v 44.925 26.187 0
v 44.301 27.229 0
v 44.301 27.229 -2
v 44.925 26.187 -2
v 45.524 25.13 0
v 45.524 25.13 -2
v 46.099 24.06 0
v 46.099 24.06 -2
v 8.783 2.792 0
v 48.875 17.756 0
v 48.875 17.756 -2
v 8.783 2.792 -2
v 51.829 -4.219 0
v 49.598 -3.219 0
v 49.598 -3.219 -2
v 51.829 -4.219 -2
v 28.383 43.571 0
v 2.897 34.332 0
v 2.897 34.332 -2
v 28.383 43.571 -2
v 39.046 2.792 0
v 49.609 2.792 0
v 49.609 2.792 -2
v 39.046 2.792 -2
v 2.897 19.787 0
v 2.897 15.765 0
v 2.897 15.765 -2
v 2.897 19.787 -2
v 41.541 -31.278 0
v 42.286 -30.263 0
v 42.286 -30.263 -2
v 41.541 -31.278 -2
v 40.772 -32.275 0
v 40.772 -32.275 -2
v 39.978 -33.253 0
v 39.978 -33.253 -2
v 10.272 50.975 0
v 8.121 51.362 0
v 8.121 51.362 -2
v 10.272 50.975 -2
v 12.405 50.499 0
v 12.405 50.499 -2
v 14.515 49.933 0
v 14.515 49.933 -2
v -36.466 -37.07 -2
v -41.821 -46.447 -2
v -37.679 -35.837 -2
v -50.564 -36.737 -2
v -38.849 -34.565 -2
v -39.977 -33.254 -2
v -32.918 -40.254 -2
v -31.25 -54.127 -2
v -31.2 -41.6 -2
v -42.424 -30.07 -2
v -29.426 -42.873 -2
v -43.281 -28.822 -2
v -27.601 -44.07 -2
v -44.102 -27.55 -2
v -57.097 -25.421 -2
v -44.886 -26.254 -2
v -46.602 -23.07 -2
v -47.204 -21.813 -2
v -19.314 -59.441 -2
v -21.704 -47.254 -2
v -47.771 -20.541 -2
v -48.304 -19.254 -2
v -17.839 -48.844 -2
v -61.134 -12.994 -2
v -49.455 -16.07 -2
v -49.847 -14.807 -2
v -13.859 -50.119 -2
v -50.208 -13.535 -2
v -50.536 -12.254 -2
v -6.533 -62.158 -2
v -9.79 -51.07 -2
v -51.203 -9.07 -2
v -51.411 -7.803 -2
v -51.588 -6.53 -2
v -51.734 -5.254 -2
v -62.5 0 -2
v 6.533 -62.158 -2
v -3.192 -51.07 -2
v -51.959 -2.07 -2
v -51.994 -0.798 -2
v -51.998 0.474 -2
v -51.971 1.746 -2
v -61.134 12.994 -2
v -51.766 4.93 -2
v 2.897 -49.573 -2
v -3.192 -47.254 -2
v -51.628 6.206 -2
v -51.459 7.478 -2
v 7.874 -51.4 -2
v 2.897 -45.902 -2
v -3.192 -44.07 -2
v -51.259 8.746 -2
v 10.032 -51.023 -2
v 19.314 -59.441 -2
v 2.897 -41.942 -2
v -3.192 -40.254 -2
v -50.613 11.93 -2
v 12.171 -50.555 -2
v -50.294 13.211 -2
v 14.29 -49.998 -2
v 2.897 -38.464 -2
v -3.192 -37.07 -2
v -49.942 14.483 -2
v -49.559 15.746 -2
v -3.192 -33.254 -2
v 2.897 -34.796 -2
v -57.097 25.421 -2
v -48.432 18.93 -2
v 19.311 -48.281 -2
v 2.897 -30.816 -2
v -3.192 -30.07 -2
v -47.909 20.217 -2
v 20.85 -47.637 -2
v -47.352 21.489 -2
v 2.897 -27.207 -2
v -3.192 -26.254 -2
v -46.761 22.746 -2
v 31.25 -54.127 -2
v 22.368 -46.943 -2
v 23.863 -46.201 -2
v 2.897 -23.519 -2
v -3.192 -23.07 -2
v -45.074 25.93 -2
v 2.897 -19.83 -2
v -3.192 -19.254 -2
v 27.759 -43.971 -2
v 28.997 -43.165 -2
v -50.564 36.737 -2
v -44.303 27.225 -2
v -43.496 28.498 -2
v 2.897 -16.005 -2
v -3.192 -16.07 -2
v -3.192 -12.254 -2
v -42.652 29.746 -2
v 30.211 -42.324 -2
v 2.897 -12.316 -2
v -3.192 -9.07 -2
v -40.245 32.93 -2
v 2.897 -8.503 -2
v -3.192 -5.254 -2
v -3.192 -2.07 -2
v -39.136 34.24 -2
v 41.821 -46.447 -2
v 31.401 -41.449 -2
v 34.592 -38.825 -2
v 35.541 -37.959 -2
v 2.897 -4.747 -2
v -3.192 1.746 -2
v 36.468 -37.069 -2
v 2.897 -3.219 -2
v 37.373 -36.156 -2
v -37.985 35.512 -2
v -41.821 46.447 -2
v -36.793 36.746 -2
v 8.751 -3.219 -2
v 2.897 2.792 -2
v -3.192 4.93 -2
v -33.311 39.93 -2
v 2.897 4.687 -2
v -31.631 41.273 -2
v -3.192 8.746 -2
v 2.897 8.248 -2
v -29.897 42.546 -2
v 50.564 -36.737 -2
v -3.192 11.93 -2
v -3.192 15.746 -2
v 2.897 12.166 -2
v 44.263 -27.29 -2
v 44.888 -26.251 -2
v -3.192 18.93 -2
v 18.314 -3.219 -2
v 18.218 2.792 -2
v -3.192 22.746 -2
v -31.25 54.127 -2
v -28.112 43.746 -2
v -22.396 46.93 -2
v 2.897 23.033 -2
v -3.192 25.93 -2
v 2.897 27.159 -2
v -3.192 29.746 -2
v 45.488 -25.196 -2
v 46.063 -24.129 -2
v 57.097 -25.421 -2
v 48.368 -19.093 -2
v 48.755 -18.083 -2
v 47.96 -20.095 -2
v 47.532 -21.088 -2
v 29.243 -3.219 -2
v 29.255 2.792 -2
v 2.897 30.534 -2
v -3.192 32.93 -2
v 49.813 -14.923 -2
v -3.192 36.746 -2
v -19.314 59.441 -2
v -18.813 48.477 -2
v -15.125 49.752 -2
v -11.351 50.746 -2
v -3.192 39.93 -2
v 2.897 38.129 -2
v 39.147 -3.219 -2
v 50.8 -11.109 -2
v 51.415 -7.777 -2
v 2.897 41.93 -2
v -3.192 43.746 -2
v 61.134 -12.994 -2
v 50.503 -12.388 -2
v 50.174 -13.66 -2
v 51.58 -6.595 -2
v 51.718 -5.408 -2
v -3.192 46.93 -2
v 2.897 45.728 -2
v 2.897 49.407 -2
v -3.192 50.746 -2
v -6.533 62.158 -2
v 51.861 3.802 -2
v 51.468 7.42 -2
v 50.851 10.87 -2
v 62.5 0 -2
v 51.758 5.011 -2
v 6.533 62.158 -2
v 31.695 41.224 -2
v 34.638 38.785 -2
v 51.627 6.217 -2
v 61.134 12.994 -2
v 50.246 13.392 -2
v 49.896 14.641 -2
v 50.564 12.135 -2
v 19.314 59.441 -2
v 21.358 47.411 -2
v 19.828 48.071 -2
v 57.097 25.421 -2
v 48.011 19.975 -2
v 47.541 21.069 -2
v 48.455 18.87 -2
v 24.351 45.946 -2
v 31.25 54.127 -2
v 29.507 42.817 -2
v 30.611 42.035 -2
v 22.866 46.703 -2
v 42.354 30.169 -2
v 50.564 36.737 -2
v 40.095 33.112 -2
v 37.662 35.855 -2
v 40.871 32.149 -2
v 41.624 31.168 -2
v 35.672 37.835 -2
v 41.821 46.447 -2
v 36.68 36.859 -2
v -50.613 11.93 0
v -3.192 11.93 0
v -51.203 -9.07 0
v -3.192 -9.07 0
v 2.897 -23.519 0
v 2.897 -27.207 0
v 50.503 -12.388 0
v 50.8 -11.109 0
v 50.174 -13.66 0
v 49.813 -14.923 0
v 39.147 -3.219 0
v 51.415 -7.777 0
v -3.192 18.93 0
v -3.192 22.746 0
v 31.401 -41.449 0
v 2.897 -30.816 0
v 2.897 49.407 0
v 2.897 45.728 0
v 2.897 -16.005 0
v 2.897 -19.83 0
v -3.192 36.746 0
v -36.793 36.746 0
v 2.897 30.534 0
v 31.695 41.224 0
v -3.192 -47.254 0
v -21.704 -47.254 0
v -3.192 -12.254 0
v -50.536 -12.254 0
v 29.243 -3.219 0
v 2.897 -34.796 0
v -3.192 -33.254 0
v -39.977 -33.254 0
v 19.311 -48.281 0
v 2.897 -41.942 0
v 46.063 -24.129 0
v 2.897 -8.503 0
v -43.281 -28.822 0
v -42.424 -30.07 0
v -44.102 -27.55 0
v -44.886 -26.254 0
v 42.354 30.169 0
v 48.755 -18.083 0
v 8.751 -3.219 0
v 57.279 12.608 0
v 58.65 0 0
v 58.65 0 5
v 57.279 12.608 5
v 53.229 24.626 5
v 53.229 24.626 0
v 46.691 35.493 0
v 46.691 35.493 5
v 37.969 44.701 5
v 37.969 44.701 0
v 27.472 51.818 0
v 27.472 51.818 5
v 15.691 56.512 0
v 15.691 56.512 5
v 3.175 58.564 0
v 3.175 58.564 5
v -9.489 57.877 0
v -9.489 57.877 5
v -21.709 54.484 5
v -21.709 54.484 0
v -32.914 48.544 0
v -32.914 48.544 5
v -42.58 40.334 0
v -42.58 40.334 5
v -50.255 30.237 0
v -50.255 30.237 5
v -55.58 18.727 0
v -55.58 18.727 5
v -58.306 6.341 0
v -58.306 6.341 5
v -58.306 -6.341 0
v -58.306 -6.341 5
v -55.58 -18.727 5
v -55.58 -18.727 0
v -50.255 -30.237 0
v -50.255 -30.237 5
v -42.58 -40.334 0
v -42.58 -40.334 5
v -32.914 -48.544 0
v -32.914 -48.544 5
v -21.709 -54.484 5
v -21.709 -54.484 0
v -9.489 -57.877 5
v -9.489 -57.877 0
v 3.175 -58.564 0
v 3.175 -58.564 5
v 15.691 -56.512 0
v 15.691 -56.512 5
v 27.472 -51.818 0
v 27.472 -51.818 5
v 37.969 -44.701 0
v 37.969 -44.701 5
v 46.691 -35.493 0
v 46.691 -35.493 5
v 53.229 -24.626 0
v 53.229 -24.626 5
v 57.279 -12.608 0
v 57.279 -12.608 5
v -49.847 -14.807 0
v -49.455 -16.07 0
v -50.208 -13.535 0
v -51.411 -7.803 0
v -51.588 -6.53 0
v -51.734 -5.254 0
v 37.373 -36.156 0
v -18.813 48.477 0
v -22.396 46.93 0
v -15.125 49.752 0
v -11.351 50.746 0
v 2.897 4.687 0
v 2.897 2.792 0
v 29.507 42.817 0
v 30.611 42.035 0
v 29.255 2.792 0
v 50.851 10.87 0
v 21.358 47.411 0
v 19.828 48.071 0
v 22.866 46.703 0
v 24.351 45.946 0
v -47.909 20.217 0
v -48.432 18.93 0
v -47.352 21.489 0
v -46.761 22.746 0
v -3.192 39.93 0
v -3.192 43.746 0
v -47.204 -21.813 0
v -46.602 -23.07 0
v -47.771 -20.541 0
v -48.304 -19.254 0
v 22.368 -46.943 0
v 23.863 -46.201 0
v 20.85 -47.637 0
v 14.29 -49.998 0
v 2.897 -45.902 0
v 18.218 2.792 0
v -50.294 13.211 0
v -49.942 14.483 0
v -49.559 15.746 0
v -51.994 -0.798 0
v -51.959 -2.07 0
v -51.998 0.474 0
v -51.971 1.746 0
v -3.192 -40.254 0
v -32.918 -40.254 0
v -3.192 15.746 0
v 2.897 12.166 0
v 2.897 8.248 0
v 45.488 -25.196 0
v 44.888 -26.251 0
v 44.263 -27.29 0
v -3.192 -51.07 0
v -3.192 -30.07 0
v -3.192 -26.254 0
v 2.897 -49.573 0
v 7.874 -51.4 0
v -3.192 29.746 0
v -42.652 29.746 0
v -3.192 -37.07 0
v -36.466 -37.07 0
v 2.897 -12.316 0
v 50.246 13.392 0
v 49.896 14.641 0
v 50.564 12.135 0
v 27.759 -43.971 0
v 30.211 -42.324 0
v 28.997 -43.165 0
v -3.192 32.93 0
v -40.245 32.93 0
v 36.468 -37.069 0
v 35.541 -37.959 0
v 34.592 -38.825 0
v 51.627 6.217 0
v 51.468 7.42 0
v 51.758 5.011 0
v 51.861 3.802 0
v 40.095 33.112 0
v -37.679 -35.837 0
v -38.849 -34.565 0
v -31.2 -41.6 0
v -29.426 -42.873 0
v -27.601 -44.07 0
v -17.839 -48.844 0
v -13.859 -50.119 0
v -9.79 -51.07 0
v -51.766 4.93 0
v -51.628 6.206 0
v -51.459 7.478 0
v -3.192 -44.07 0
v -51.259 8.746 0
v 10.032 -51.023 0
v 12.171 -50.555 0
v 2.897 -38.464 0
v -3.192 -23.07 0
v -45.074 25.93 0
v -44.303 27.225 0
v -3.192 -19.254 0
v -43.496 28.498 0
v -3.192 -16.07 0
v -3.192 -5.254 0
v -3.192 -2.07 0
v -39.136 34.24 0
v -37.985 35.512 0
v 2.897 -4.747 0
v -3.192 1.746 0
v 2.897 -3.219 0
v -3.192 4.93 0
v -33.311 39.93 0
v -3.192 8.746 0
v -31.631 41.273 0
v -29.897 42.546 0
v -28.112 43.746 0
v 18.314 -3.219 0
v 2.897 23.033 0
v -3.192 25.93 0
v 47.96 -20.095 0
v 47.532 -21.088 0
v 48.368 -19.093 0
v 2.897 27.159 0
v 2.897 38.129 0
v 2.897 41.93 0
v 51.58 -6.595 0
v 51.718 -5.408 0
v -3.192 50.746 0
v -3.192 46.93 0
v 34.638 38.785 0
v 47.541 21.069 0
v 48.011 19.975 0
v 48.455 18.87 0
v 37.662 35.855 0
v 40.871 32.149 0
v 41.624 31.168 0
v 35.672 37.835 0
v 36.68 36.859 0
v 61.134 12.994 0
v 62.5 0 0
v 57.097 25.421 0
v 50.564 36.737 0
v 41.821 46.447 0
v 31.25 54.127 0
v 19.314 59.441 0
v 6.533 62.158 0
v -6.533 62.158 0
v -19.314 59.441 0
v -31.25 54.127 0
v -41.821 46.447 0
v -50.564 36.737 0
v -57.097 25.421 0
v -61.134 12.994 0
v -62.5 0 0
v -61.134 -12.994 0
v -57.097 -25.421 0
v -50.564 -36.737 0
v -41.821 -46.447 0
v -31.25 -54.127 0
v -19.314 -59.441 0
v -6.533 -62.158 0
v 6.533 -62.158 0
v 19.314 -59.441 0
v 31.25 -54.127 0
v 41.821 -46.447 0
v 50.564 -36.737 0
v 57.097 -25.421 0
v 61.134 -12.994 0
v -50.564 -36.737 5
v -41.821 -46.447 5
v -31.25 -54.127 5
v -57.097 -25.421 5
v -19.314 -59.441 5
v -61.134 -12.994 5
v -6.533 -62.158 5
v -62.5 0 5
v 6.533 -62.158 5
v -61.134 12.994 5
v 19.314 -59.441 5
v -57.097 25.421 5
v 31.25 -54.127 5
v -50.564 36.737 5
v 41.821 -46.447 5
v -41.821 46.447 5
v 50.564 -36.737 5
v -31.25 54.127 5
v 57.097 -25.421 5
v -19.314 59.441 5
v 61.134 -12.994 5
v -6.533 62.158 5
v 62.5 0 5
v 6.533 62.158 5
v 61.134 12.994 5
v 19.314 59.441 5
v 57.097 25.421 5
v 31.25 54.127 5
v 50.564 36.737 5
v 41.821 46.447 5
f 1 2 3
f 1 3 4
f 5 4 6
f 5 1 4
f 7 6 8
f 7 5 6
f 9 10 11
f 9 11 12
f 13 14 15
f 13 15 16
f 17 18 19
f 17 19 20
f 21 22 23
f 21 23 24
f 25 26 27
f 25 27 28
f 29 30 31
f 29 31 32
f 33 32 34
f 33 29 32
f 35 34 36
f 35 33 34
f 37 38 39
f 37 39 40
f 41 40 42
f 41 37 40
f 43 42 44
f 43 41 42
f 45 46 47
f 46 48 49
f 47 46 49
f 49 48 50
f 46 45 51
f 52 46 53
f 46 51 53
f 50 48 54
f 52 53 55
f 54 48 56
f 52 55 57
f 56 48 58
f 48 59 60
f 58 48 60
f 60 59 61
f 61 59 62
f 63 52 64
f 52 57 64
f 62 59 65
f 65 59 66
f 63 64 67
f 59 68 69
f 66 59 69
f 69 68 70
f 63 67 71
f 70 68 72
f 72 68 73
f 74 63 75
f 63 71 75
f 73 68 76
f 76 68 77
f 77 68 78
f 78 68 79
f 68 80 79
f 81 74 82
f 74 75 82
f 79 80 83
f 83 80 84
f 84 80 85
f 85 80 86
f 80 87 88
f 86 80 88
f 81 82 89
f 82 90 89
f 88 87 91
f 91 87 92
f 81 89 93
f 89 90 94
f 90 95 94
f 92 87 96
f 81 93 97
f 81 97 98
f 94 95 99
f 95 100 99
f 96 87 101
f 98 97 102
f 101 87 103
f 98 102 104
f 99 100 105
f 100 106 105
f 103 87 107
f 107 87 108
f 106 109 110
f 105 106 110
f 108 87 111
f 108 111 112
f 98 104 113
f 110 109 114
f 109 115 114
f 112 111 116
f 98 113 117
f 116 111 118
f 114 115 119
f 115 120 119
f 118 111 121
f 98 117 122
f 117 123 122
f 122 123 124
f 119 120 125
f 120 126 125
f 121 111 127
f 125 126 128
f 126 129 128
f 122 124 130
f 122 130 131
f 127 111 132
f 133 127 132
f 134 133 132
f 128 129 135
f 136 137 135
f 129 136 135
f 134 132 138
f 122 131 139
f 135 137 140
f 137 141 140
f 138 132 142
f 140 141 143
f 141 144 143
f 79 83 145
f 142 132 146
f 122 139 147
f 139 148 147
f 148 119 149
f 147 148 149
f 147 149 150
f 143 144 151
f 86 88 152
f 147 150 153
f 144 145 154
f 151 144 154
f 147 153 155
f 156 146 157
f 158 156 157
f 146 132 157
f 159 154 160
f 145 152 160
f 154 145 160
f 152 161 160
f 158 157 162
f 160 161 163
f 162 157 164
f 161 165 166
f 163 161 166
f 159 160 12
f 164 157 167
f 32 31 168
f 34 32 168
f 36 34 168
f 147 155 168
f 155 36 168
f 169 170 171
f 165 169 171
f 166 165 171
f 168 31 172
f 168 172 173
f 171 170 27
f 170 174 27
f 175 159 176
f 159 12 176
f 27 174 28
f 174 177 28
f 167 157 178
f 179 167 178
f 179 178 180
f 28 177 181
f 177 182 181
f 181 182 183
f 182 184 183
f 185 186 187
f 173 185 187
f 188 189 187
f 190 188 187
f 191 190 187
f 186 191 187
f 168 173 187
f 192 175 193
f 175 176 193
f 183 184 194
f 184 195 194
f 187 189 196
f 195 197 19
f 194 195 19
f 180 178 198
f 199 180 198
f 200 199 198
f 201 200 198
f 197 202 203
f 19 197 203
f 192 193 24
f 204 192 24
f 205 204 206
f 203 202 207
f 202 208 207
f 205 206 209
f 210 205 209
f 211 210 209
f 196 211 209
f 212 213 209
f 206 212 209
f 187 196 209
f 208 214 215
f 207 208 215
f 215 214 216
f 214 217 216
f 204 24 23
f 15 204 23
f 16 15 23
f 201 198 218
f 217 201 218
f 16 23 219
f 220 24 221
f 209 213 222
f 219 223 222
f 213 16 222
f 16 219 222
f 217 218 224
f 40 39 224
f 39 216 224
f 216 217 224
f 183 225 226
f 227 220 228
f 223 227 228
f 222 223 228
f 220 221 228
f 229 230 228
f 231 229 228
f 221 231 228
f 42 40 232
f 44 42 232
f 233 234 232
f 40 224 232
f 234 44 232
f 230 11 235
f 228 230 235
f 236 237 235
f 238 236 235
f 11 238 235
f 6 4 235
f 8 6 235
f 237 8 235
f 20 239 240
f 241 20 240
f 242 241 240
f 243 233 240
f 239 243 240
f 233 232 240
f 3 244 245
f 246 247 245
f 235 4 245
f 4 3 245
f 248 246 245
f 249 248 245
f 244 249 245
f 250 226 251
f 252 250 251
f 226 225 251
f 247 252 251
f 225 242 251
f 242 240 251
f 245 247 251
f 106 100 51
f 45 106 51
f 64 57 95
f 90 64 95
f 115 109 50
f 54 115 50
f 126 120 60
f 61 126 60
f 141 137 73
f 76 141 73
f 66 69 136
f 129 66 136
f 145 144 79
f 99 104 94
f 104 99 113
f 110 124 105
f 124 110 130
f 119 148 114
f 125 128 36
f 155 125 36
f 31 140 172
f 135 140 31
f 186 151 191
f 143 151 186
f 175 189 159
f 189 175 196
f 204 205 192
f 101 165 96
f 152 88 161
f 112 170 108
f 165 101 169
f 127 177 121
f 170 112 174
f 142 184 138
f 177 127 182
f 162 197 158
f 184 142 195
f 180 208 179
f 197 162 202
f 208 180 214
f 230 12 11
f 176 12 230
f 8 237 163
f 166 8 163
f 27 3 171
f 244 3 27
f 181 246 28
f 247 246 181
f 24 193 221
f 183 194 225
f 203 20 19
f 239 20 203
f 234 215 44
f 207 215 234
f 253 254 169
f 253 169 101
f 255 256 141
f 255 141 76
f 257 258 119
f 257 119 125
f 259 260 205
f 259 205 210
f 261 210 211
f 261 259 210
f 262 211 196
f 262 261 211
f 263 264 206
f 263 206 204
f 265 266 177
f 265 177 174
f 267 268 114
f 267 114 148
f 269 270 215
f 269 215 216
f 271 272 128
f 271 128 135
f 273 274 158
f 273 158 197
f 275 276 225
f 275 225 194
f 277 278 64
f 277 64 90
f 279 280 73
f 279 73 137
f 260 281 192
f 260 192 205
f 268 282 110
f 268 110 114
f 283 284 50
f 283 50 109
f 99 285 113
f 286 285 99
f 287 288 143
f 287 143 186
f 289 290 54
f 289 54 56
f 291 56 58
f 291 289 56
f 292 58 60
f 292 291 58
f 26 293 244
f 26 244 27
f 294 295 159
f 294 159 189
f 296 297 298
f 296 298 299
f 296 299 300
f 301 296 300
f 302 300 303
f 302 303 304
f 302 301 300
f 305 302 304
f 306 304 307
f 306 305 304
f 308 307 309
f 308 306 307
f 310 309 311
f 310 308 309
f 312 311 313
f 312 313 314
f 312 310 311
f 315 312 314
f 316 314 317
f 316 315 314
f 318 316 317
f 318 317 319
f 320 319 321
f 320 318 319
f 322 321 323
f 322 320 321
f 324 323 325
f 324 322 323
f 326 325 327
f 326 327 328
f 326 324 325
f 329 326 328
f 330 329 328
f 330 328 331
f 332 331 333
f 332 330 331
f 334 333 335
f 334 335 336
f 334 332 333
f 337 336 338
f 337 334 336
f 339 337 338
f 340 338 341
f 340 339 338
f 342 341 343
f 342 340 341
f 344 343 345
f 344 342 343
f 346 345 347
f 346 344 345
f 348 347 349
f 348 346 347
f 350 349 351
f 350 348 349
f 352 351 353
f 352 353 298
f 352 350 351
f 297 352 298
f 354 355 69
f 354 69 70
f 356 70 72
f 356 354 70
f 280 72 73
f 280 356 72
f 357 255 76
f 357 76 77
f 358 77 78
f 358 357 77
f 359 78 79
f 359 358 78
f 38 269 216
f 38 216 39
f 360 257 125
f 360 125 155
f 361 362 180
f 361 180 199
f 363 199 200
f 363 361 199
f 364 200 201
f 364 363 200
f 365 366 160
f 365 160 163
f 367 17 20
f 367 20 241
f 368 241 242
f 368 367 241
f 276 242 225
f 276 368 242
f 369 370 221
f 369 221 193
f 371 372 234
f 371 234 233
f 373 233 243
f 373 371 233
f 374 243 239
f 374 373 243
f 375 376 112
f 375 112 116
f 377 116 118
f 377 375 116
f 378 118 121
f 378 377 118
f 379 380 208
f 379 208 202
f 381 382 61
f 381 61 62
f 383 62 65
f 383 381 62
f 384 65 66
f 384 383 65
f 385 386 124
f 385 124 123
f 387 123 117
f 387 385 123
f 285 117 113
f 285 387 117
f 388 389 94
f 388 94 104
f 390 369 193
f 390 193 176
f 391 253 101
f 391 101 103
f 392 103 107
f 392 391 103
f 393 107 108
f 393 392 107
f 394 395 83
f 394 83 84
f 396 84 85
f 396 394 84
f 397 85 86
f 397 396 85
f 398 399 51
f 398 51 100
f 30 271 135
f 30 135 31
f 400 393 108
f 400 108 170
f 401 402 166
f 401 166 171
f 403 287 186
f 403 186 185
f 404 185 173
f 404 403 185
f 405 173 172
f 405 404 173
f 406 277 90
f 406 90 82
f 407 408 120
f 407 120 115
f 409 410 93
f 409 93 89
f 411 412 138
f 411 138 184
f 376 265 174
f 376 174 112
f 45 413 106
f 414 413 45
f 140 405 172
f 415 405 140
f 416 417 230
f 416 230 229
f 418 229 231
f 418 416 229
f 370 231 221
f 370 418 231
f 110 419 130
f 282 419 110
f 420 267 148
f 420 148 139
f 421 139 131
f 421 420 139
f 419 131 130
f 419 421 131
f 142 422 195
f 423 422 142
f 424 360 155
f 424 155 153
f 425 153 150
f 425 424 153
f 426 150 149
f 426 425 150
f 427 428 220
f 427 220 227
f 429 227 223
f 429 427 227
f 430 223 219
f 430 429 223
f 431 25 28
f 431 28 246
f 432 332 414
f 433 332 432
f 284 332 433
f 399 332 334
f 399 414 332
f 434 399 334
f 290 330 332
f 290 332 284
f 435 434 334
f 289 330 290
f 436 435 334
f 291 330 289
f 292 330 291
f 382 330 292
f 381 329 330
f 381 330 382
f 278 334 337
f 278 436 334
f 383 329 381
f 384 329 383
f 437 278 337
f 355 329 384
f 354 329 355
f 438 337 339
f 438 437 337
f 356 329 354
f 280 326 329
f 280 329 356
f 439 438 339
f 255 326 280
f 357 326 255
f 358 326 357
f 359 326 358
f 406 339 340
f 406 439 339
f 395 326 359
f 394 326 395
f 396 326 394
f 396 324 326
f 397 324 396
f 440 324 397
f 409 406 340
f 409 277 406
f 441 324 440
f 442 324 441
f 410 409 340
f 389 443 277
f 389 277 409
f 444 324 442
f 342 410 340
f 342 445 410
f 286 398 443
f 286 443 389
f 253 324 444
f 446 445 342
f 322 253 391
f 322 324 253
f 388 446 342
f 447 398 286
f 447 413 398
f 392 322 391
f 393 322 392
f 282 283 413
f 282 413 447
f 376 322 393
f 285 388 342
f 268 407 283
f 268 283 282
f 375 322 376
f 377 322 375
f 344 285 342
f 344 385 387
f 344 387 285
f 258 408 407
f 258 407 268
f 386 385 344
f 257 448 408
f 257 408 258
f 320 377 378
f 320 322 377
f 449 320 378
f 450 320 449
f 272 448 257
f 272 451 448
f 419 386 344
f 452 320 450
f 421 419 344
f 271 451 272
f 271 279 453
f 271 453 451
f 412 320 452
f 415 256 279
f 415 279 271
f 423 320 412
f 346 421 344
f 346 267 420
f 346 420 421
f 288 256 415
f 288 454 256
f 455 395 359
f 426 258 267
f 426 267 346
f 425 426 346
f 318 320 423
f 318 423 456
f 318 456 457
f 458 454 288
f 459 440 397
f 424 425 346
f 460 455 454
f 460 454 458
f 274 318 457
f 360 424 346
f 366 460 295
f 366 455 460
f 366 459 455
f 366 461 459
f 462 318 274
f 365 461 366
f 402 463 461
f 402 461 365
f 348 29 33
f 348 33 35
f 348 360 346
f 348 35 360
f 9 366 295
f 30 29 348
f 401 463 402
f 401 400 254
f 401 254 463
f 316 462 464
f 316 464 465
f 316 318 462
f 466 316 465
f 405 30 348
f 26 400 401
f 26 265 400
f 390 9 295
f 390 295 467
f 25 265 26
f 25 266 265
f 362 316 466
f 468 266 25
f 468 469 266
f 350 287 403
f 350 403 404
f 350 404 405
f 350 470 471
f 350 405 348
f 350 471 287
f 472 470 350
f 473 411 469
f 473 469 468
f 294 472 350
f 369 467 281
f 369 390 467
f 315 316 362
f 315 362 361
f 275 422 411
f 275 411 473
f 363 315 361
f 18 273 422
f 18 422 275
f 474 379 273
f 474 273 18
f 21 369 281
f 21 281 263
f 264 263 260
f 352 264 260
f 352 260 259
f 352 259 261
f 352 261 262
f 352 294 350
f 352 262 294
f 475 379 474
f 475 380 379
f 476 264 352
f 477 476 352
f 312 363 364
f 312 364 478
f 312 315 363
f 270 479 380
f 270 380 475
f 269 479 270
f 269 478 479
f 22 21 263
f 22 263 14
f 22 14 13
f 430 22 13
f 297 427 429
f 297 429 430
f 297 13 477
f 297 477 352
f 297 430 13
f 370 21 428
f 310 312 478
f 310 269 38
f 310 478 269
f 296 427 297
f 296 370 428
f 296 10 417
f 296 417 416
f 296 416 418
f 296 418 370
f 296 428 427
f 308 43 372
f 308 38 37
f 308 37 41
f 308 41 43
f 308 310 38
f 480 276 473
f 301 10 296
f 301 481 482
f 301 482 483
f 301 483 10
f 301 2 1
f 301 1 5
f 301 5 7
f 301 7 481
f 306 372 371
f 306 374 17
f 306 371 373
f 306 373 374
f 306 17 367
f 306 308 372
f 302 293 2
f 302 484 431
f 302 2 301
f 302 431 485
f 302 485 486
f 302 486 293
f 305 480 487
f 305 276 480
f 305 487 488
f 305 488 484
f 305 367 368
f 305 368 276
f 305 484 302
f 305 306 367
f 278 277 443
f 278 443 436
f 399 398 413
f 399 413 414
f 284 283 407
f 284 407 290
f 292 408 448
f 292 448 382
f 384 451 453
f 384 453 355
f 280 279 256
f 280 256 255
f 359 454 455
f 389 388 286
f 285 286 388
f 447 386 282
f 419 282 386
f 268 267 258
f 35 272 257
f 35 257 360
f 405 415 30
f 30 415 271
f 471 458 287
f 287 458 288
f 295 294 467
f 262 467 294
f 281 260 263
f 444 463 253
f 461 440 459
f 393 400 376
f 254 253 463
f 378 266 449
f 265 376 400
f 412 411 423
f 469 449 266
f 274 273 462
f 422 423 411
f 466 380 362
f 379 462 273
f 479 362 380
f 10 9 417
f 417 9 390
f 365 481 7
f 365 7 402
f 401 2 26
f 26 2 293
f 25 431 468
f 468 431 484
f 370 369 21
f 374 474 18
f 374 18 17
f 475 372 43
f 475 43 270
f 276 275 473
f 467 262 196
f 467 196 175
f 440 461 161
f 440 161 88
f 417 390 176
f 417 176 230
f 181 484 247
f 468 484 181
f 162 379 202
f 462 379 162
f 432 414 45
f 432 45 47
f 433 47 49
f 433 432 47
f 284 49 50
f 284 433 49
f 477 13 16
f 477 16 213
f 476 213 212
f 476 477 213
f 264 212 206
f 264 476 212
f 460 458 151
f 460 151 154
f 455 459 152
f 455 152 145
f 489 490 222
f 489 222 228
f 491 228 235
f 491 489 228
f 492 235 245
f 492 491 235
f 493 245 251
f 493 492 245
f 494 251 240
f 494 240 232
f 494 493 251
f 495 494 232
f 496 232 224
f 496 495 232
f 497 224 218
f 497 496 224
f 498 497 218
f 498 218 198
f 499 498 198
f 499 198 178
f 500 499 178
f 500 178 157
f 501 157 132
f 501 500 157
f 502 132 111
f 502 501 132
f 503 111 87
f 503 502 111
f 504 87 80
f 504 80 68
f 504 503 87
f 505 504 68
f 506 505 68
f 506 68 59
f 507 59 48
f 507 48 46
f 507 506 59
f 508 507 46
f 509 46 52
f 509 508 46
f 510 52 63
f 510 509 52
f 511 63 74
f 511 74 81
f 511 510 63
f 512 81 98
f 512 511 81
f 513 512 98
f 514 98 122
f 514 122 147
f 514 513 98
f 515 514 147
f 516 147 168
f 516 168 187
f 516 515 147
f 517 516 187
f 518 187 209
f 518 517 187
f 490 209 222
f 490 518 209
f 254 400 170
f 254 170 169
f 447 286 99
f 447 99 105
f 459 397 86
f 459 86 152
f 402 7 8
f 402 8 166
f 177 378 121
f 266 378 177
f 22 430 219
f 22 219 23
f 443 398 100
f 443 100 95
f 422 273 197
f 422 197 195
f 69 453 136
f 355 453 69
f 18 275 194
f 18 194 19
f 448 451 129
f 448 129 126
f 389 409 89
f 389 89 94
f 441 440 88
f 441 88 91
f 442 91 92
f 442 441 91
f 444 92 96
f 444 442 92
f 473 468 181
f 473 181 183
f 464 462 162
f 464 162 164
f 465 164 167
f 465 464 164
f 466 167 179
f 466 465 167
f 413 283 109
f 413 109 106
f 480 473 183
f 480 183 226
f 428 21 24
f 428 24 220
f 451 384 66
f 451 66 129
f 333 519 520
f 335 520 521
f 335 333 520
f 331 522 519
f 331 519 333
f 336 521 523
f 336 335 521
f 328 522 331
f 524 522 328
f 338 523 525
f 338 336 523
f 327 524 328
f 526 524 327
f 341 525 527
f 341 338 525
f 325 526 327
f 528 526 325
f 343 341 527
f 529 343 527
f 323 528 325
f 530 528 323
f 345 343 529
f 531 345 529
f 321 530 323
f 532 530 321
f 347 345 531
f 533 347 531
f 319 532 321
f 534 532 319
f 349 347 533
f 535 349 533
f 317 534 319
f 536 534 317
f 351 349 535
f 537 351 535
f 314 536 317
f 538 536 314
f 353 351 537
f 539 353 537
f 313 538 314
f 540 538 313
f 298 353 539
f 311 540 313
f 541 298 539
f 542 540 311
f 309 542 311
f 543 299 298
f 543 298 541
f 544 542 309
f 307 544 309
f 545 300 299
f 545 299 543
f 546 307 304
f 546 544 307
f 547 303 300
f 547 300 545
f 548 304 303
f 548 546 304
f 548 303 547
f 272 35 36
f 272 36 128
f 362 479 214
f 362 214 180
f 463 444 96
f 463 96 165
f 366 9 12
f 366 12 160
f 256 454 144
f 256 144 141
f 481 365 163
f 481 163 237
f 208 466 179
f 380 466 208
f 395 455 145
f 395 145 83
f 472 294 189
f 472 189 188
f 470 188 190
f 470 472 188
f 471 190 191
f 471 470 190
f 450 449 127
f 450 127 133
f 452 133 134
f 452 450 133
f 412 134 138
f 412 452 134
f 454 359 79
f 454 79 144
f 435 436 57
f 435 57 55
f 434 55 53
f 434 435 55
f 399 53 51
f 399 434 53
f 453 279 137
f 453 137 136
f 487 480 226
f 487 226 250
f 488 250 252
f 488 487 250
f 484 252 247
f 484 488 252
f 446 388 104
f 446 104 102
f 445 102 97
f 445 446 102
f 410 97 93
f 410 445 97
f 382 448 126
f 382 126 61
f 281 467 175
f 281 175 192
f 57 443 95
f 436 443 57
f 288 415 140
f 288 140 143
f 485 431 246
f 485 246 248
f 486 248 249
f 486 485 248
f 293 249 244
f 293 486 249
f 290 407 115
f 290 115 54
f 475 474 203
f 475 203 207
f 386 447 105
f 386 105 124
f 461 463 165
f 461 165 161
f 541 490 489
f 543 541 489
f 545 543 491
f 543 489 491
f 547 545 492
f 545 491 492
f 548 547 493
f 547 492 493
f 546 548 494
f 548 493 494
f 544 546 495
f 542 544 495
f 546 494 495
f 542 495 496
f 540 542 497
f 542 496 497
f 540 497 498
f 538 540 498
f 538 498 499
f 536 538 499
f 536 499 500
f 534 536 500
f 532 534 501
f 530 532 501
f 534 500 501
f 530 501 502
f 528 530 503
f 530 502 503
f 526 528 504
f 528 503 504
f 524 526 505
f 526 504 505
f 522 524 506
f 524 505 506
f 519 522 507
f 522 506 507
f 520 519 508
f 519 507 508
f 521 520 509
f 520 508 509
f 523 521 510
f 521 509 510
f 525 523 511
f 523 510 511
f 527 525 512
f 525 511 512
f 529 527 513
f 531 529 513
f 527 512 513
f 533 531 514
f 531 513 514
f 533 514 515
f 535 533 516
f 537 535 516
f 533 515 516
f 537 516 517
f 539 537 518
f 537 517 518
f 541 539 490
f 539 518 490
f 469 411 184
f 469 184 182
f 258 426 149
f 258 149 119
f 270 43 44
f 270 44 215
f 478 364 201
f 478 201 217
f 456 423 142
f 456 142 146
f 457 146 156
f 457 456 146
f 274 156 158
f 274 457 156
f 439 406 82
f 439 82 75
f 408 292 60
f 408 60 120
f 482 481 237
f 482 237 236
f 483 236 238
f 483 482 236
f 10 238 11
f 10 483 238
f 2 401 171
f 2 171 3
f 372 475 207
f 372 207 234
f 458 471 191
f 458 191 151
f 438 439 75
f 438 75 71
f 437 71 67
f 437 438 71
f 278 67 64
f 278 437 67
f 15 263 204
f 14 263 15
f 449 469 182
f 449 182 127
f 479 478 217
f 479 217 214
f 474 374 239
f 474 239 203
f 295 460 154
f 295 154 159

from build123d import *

# Parameters (mm, degrees)
F0_R     = 62.5
F0_R_2   = 58.65
F1_DEPTH = 2
F2_DEPTH = 5


with BuildPart() as f1:
    # F0 (on Top) → F1 (new body)
    with BuildSketch(Plane.XY):
        Circle(F0_R)
        Circle(F0_R_2, mode=Mode.SUBTRACT)
        Circle(F0_R_2)
        with BuildLine():
            Line((-3.191882, -47.253954), (-3.191882, -51.070154))
            Line((-3.191882, -51.070154), (-9.78976, -51.070154))
            ThreePointArc((-9.78976, -51.070154), (-15.862066, -49.52166), (-21.704005, -47.253954))
            Line((-21.704005, -47.253954), (-3.191882, -47.253954))
        make_face(mode=Mode.SUBTRACT)
        with BuildLine():
            Line((-32.918372, -40.253954), (-3.191882, -40.253954))
            Line((-3.191882, -40.253954), (-3.191882, -44.070154))
            Line((-3.191882, -44.070154), (-27.601115, -44.070154))
            ThreePointArc((-27.601115, -44.070154), (-30.319844, -42.245794), (-32.918372, -40.253954))
        make_face(mode=Mode.SUBTRACT)
        with BuildLine():
            Line((-39.977175, -33.253954), (-3.191882, -33.253954))
            Line((-3.191882, -33.253954), (-3.191882, -37.070154))
            Line((-3.191882, -37.070154), (-36.466474, -37.070154))
            ThreePointArc((-36.466474, -37.070154), (-38.269423, -35.205842), (-39.977175, -33.253954))
        make_face(mode=Mode.SUBTRACT)
        with BuildLine():
            Line((-44.885743, -26.253954), (-3.191882, -26.253954))
            Line((-3.191882, -26.253954), (-3.191882, -30.070154))
            Line((-3.191882, -30.070154), (-42.423883, -30.070154))
            ThreePointArc((-42.423883, -30.070154), (-43.696493, -28.188942), (-44.885743, -26.253954))
        make_face(mode=Mode.SUBTRACT)
        with BuildLine():
            Line((-48.304091, -19.253954), (-3.191882, -19.253954))
            Line((-3.191882, -19.253954), (-3.191882, -23.070154))
            Line((-3.191882, -23.070154), (-46.602232, -23.070154))
            ThreePointArc((-46.602232, -23.070154), (-47.491509, -21.179155), (-48.304091, -19.253954))
        make_face(mode=Mode.SUBTRACT)
        with BuildLine():
            Line((-50.535538, -12.253954), (-3.191882, -12.253954))
            Line((-3.191882, -12.253954), (-3.191882, -16.070154))
            Line((-3.191882, -16.070154), (-49.454526, -16.070154))
            ThreePointArc((-49.454526, -16.070154), (-50.031431, -14.172365), (-50.535538, -12.253954))
        make_face(mode=Mode.SUBTRACT)
        with BuildLine():
            Line((-51.733896, -5.253954), (-3.191882, -5.253954))
            Line((-3.191882, -5.253954), (-3.191882, -9.070154))
            Line((-3.191882, -9.070154), (-51.202855, -9.070154))
            ThreePointArc((-51.202855, -9.070154), (-51.503733, -7.166974), (-51.733896, -5.253954))
        make_face(mode=Mode.SUBTRACT)
        with BuildLine():
            Line((-51.970678, 1.746046), (-3.191882, 1.746046))
            Line((-3.191882, 1.746046), (-3.191882, -2.070154))
            Line((-3.191882, -2.070154), (-51.958777, -2.070154))
            ThreePointArc((-51.958777, -2.070154), (-51.999747, -0.162163), (-51.970678, 1.746046))
        make_face(mode=Mode.SUBTRACT)
        with BuildLine():
            Line((7.873907, -51.400405), (2.896511, -49.572833))
            Line((2.896511, -49.572833), (2.896511, -45.902099))
            Line((2.896511, -45.902099), (14.289776, -49.998023))
            ThreePointArc((14.289776, -49.998023), (11.104003, -50.800602), (7.873907, -51.400405))
        make_face(mode=Mode.SUBTRACT)
        with BuildLine():
            Line((19.31125, -48.281214), (2.896511, -41.941576))
            Line((2.896511, -41.941576), (2.896511, -38.46404))
            Line((2.896511, -38.46404), (23.862975, -46.201281))
            ThreePointArc((23.862975, -46.201281), (21.612149, -47.296036), (19.31125, -48.281214))
        make_face(mode=Mode.SUBTRACT)
        with BuildLine():
            Line((27.758943, -43.970912), (2.896511, -34.795944))
            Line((2.896511, -34.795944), (2.896511, -30.815715))
            Line((2.896511, -30.815715), (31.400508, -41.448861))
            ThreePointArc((31.400508, -41.448861), (29.606593, -42.74868), (27.758943, -43.970912))
        make_face(mode=Mode.SUBTRACT)
        with BuildLine():
            ThreePointArc((37.372623, -36.156424), (36.007063, -37.516548), (34.592037, -38.825133))
            Line((34.592037, -38.825133), (2.896511, -27.206514))
            Line((2.896511, -27.206514), (2.896511, -23.518527))
            Line((2.896511, -23.518527), (37.372623, -36.156424))
        make_face(mode=Mode.SUBTRACT)
        with BuildLine():
            Line((39.978156, -33.252775), (2.896511, -19.830042))
            Line((2.896511, -19.830042), (2.896511, -16.004948))
            Line((2.896511, -16.004948), (42.286384, -30.263208))
            ThreePointArc((42.286384, -30.263208), (41.159422, -31.778955), (39.978156, -33.252775))
        make_face(mode=Mode.SUBTRACT)
        with BuildLine():
            Line((44.263286, -27.290319), (2.896511, -12.316464))
            Line((2.896511, -12.316464), (2.896511, -8.503364))
            Line((2.896511, -8.503364), (46.063064, -24.128698))
            ThreePointArc((46.063064, -24.128698), (45.190833, -25.725253), (44.263286, -27.290319))
        make_face(mode=Mode.SUBTRACT)
        with BuildLine():
            Line((2.896511, -4.746575), (2.896511, -3.21917))
            Line((2.896511, -3.21917), (8.751221, -3.21917))
            Line((8.751221, -3.21917), (48.754682, -18.082614))
            ThreePointArc((48.754682, -18.082614), (48.166824, -19.594823), (47.532074, -21.087957))
            Line((47.532074, -21.087957), (2.896511, -4.746575))
        make_face(mode=Mode.SUBTRACT)
        with BuildLine():
            Line((49.812785, -14.922684), (18.313957, -3.21917))
            Line((18.313957, -3.21917), (29.242799, -3.21917))
            Line((29.242799, -3.21917), (50.799583, -11.10866))
            ThreePointArc((50.799583, -11.10866), (50.342317, -13.025021), (49.812785, -14.922684))
        make_face(mode=Mode.SUBTRACT)
        with BuildLine():
            Line((51.415095, -7.777406), (39.14706, -3.21917))
            Line((39.14706, -3.21917), (49.597766, -3.21917))
            Line((49.597766, -3.21917), (51.828544, -4.219248))
            ThreePointArc((51.828544, -4.219248), (51.652467, -6.001889), (51.415095, -7.777406))
        make_face(mode=Mode.SUBTRACT)
        with BuildLine():
            Line((-51.259211, 8.746046), (-3.191882, 8.746046))
            Line((-3.191882, 8.746046), (-3.191882, 4.929846))
            Line((-3.191882, 4.929846), (-51.765786, 4.929846))
            ThreePointArc((-51.765786, 4.929846), (-51.547826, 6.842636), (-51.259211, 8.746046))
        make_face(mode=Mode.SUBTRACT)
        with BuildLine():
            Line((-49.558673, 15.746046), (-3.191882, 15.746046))
            Line((-3.191882, 15.746046), (-3.191882, 11.929846))
            Line((-3.191882, 11.929846), (-50.61303, 11.929846))
            ThreePointArc((-50.61303, 11.929846), (-50.122184, 13.847984), (-49.558673, 15.746046))
        make_face(mode=Mode.SUBTRACT)
        with BuildLine():
            Line((-46.761281, 22.746046), (-3.191882, 22.746046))
            Line((-3.191882, 22.746046), (-3.191882, 18.929846))
            Line((-3.191882, 18.929846), (-48.432024, 18.929846))
            ThreePointArc((-48.432024, 18.929846), (-47.634884, 20.854684), (-46.761281, 22.746046))
        make_face(mode=Mode.SUBTRACT)
        with BuildLine():
            Line((-42.651761, 29.746046), (-3.191882, 29.746046))
            Line((-3.191882, 29.746046), (-3.191882, 25.929846))
            Line((-3.191882, 25.929846), (-45.073751, 25.929846))
            ThreePointArc((-45.073751, 25.929846), (-43.904239, 27.864274), (-42.651761, 29.746046))
        make_face(mode=Mode.SUBTRACT)
        with BuildLine():
            Line((-36.793044, 36.746046), (-3.191882, 36.746046))
            Line((-3.191882, 36.746046), (-3.191882, 32.929846))
            Line((-3.191882, 32.929846), (-40.244568, 32.929846))
            ThreePointArc((-40.244568, 32.929846), (-38.566038, 34.880664), (-36.793044, 36.746046))
        make_face(mode=Mode.SUBTRACT)
        with BuildLine():
            Line((-28.111981, 43.746046), (-3.191882, 43.746046))
            Line((-3.191882, 43.746046), (-3.191882, 39.929846))
            Line((-3.191882, 39.929846), (-33.31077, 39.929846))
            ThreePointArc((-33.31077, 39.929846), (-30.770593, 41.918619), (-28.111981, 43.746046))
        make_face(mode=Mode.SUBTRACT)
        with BuildLine():
            ThreePointArc((-22.396194, 46.929846), (-16.981001, 49.149218), (-11.350719, 50.746046))
            Line((-11.350719, 50.746046), (-3.191882, 50.746046))
            Line((-3.191882, 50.746046), (-3.191882, 46.929846))
            Line((-3.191882, 46.929846), (-22.396194, 46.929846))
        make_face(mode=Mode.SUBTRACT)
        with BuildLine():
            Line((8.782855, 2.79247), (2.896511, 2.79247))
            Line((2.896511, 2.79247), (2.896511, 4.687412))
            Line((2.896511, 4.687412), (47.540674, 21.068563))
            ThreePointArc((47.540674, 21.068563), (48.236133, 19.423579), (48.874694, 17.755684))
            Line((48.874694, 17.755684), (8.782855, 2.79247))
        make_face(mode=Mode.SUBTRACT)
        with BuildLine():
            Line((46.099099, 24.059782), (2.896511, 8.247841))
            Line((2.896511, 8.247841), (2.896511, 12.165699))
            Line((2.896511, 12.165699), (44.300966, 27.22911))
            ThreePointArc((44.300966, 27.22911), (45.227802, 25.660202), (46.099099, 24.059782))
        make_face(mode=Mode.SUBTRACT)
        with BuildLine():
            Line((42.353825, 30.16875), (2.896511, 15.764672))
            Line((2.896511, 15.764672), (2.896511, 19.787056))
            Line((2.896511, 19.787056), (40.094616, 33.11226))
            ThreePointArc((40.094616, 33.11226), (41.250484, 31.660663), (42.353825, 30.16875))
        make_face(mode=Mode.SUBTRACT)
        with BuildLine():
            Line((37.661768, 35.855142), (2.896511, 23.033189))
            Line((2.896511, 23.033189), (2.896511, 27.158916))
            Line((2.896511, 27.158916), (34.637542, 38.784542))
            ThreePointArc((34.637542, 38.784542), (36.179316, 37.350463), (37.661768, 35.855142))
        make_face(mode=Mode.SUBTRACT)
        with BuildLine():
            ThreePointArc((51.467824, 7.420449), (51.695994, 5.614641), (51.860825, 3.801954))
            Line((51.860825, 3.801954), (49.609106, 2.79247))
            Line((49.609106, 2.79247), (39.046496, 2.79247))
            Line((39.046496, 2.79247), (51.467824, 7.420449))
        make_face(mode=Mode.SUBTRACT)
        with BuildLine():
            Line((50.851188, 10.869989), (29.255319, 2.79247))
            Line((29.255319, 2.79247), (18.217992, 2.79247))
            Line((18.217992, 2.79247), (49.896269, 14.64112))
            ThreePointArc((49.896269, 14.64112), (50.409006, 12.764487), (50.851188, 10.869989))
        make_face(mode=Mode.SUBTRACT)
        with BuildLine():
            Line((24.35126, 45.945796), (2.896511, 38.12946))
            Line((2.896511, 38.12946), (2.896511, 41.930046))
            Line((2.896511, 41.930046), (19.827624, 48.071461))
            ThreePointArc((19.827624, 48.071461), (22.114996, 47.06301), (24.35126, 45.945796))
        make_face(mode=Mode.SUBTRACT)
        with BuildLine():
            Line((31.694718, 41.224324), (2.896511, 30.533878))
            Line((2.896511, 30.533878), (2.896511, 34.331668))
            Line((2.896511, 34.331668), (28.38323, 43.570543))
            ThreePointArc((28.38323, 43.570543), (30.061872, 42.429752), (31.694718, 41.224324))
        make_face(mode=Mode.SUBTRACT)
        with BuildLine():
            Line((14.515265, 49.933026), (2.896511, 45.727838))
            Line((2.896511, 45.727838), (2.896511, 49.406949))
            Line((2.896511, 49.406949), (8.121136, 51.361923))
            ThreePointArc((8.121136, 51.361923), (11.340727, 50.74828), (14.515265, 49.933026))
        make_face(mode=Mode.SUBTRACT)
    extrude(amount=-F1_DEPTH)

    # F0 (on Top) → F2 (join)
    with BuildSketch(Plane.XY):
        Circle(F0_R)
        Circle(F0_R_2, mode=Mode.SUBTRACT)
    extrude(amount=F2_DEPTH)


solid = f1.part
